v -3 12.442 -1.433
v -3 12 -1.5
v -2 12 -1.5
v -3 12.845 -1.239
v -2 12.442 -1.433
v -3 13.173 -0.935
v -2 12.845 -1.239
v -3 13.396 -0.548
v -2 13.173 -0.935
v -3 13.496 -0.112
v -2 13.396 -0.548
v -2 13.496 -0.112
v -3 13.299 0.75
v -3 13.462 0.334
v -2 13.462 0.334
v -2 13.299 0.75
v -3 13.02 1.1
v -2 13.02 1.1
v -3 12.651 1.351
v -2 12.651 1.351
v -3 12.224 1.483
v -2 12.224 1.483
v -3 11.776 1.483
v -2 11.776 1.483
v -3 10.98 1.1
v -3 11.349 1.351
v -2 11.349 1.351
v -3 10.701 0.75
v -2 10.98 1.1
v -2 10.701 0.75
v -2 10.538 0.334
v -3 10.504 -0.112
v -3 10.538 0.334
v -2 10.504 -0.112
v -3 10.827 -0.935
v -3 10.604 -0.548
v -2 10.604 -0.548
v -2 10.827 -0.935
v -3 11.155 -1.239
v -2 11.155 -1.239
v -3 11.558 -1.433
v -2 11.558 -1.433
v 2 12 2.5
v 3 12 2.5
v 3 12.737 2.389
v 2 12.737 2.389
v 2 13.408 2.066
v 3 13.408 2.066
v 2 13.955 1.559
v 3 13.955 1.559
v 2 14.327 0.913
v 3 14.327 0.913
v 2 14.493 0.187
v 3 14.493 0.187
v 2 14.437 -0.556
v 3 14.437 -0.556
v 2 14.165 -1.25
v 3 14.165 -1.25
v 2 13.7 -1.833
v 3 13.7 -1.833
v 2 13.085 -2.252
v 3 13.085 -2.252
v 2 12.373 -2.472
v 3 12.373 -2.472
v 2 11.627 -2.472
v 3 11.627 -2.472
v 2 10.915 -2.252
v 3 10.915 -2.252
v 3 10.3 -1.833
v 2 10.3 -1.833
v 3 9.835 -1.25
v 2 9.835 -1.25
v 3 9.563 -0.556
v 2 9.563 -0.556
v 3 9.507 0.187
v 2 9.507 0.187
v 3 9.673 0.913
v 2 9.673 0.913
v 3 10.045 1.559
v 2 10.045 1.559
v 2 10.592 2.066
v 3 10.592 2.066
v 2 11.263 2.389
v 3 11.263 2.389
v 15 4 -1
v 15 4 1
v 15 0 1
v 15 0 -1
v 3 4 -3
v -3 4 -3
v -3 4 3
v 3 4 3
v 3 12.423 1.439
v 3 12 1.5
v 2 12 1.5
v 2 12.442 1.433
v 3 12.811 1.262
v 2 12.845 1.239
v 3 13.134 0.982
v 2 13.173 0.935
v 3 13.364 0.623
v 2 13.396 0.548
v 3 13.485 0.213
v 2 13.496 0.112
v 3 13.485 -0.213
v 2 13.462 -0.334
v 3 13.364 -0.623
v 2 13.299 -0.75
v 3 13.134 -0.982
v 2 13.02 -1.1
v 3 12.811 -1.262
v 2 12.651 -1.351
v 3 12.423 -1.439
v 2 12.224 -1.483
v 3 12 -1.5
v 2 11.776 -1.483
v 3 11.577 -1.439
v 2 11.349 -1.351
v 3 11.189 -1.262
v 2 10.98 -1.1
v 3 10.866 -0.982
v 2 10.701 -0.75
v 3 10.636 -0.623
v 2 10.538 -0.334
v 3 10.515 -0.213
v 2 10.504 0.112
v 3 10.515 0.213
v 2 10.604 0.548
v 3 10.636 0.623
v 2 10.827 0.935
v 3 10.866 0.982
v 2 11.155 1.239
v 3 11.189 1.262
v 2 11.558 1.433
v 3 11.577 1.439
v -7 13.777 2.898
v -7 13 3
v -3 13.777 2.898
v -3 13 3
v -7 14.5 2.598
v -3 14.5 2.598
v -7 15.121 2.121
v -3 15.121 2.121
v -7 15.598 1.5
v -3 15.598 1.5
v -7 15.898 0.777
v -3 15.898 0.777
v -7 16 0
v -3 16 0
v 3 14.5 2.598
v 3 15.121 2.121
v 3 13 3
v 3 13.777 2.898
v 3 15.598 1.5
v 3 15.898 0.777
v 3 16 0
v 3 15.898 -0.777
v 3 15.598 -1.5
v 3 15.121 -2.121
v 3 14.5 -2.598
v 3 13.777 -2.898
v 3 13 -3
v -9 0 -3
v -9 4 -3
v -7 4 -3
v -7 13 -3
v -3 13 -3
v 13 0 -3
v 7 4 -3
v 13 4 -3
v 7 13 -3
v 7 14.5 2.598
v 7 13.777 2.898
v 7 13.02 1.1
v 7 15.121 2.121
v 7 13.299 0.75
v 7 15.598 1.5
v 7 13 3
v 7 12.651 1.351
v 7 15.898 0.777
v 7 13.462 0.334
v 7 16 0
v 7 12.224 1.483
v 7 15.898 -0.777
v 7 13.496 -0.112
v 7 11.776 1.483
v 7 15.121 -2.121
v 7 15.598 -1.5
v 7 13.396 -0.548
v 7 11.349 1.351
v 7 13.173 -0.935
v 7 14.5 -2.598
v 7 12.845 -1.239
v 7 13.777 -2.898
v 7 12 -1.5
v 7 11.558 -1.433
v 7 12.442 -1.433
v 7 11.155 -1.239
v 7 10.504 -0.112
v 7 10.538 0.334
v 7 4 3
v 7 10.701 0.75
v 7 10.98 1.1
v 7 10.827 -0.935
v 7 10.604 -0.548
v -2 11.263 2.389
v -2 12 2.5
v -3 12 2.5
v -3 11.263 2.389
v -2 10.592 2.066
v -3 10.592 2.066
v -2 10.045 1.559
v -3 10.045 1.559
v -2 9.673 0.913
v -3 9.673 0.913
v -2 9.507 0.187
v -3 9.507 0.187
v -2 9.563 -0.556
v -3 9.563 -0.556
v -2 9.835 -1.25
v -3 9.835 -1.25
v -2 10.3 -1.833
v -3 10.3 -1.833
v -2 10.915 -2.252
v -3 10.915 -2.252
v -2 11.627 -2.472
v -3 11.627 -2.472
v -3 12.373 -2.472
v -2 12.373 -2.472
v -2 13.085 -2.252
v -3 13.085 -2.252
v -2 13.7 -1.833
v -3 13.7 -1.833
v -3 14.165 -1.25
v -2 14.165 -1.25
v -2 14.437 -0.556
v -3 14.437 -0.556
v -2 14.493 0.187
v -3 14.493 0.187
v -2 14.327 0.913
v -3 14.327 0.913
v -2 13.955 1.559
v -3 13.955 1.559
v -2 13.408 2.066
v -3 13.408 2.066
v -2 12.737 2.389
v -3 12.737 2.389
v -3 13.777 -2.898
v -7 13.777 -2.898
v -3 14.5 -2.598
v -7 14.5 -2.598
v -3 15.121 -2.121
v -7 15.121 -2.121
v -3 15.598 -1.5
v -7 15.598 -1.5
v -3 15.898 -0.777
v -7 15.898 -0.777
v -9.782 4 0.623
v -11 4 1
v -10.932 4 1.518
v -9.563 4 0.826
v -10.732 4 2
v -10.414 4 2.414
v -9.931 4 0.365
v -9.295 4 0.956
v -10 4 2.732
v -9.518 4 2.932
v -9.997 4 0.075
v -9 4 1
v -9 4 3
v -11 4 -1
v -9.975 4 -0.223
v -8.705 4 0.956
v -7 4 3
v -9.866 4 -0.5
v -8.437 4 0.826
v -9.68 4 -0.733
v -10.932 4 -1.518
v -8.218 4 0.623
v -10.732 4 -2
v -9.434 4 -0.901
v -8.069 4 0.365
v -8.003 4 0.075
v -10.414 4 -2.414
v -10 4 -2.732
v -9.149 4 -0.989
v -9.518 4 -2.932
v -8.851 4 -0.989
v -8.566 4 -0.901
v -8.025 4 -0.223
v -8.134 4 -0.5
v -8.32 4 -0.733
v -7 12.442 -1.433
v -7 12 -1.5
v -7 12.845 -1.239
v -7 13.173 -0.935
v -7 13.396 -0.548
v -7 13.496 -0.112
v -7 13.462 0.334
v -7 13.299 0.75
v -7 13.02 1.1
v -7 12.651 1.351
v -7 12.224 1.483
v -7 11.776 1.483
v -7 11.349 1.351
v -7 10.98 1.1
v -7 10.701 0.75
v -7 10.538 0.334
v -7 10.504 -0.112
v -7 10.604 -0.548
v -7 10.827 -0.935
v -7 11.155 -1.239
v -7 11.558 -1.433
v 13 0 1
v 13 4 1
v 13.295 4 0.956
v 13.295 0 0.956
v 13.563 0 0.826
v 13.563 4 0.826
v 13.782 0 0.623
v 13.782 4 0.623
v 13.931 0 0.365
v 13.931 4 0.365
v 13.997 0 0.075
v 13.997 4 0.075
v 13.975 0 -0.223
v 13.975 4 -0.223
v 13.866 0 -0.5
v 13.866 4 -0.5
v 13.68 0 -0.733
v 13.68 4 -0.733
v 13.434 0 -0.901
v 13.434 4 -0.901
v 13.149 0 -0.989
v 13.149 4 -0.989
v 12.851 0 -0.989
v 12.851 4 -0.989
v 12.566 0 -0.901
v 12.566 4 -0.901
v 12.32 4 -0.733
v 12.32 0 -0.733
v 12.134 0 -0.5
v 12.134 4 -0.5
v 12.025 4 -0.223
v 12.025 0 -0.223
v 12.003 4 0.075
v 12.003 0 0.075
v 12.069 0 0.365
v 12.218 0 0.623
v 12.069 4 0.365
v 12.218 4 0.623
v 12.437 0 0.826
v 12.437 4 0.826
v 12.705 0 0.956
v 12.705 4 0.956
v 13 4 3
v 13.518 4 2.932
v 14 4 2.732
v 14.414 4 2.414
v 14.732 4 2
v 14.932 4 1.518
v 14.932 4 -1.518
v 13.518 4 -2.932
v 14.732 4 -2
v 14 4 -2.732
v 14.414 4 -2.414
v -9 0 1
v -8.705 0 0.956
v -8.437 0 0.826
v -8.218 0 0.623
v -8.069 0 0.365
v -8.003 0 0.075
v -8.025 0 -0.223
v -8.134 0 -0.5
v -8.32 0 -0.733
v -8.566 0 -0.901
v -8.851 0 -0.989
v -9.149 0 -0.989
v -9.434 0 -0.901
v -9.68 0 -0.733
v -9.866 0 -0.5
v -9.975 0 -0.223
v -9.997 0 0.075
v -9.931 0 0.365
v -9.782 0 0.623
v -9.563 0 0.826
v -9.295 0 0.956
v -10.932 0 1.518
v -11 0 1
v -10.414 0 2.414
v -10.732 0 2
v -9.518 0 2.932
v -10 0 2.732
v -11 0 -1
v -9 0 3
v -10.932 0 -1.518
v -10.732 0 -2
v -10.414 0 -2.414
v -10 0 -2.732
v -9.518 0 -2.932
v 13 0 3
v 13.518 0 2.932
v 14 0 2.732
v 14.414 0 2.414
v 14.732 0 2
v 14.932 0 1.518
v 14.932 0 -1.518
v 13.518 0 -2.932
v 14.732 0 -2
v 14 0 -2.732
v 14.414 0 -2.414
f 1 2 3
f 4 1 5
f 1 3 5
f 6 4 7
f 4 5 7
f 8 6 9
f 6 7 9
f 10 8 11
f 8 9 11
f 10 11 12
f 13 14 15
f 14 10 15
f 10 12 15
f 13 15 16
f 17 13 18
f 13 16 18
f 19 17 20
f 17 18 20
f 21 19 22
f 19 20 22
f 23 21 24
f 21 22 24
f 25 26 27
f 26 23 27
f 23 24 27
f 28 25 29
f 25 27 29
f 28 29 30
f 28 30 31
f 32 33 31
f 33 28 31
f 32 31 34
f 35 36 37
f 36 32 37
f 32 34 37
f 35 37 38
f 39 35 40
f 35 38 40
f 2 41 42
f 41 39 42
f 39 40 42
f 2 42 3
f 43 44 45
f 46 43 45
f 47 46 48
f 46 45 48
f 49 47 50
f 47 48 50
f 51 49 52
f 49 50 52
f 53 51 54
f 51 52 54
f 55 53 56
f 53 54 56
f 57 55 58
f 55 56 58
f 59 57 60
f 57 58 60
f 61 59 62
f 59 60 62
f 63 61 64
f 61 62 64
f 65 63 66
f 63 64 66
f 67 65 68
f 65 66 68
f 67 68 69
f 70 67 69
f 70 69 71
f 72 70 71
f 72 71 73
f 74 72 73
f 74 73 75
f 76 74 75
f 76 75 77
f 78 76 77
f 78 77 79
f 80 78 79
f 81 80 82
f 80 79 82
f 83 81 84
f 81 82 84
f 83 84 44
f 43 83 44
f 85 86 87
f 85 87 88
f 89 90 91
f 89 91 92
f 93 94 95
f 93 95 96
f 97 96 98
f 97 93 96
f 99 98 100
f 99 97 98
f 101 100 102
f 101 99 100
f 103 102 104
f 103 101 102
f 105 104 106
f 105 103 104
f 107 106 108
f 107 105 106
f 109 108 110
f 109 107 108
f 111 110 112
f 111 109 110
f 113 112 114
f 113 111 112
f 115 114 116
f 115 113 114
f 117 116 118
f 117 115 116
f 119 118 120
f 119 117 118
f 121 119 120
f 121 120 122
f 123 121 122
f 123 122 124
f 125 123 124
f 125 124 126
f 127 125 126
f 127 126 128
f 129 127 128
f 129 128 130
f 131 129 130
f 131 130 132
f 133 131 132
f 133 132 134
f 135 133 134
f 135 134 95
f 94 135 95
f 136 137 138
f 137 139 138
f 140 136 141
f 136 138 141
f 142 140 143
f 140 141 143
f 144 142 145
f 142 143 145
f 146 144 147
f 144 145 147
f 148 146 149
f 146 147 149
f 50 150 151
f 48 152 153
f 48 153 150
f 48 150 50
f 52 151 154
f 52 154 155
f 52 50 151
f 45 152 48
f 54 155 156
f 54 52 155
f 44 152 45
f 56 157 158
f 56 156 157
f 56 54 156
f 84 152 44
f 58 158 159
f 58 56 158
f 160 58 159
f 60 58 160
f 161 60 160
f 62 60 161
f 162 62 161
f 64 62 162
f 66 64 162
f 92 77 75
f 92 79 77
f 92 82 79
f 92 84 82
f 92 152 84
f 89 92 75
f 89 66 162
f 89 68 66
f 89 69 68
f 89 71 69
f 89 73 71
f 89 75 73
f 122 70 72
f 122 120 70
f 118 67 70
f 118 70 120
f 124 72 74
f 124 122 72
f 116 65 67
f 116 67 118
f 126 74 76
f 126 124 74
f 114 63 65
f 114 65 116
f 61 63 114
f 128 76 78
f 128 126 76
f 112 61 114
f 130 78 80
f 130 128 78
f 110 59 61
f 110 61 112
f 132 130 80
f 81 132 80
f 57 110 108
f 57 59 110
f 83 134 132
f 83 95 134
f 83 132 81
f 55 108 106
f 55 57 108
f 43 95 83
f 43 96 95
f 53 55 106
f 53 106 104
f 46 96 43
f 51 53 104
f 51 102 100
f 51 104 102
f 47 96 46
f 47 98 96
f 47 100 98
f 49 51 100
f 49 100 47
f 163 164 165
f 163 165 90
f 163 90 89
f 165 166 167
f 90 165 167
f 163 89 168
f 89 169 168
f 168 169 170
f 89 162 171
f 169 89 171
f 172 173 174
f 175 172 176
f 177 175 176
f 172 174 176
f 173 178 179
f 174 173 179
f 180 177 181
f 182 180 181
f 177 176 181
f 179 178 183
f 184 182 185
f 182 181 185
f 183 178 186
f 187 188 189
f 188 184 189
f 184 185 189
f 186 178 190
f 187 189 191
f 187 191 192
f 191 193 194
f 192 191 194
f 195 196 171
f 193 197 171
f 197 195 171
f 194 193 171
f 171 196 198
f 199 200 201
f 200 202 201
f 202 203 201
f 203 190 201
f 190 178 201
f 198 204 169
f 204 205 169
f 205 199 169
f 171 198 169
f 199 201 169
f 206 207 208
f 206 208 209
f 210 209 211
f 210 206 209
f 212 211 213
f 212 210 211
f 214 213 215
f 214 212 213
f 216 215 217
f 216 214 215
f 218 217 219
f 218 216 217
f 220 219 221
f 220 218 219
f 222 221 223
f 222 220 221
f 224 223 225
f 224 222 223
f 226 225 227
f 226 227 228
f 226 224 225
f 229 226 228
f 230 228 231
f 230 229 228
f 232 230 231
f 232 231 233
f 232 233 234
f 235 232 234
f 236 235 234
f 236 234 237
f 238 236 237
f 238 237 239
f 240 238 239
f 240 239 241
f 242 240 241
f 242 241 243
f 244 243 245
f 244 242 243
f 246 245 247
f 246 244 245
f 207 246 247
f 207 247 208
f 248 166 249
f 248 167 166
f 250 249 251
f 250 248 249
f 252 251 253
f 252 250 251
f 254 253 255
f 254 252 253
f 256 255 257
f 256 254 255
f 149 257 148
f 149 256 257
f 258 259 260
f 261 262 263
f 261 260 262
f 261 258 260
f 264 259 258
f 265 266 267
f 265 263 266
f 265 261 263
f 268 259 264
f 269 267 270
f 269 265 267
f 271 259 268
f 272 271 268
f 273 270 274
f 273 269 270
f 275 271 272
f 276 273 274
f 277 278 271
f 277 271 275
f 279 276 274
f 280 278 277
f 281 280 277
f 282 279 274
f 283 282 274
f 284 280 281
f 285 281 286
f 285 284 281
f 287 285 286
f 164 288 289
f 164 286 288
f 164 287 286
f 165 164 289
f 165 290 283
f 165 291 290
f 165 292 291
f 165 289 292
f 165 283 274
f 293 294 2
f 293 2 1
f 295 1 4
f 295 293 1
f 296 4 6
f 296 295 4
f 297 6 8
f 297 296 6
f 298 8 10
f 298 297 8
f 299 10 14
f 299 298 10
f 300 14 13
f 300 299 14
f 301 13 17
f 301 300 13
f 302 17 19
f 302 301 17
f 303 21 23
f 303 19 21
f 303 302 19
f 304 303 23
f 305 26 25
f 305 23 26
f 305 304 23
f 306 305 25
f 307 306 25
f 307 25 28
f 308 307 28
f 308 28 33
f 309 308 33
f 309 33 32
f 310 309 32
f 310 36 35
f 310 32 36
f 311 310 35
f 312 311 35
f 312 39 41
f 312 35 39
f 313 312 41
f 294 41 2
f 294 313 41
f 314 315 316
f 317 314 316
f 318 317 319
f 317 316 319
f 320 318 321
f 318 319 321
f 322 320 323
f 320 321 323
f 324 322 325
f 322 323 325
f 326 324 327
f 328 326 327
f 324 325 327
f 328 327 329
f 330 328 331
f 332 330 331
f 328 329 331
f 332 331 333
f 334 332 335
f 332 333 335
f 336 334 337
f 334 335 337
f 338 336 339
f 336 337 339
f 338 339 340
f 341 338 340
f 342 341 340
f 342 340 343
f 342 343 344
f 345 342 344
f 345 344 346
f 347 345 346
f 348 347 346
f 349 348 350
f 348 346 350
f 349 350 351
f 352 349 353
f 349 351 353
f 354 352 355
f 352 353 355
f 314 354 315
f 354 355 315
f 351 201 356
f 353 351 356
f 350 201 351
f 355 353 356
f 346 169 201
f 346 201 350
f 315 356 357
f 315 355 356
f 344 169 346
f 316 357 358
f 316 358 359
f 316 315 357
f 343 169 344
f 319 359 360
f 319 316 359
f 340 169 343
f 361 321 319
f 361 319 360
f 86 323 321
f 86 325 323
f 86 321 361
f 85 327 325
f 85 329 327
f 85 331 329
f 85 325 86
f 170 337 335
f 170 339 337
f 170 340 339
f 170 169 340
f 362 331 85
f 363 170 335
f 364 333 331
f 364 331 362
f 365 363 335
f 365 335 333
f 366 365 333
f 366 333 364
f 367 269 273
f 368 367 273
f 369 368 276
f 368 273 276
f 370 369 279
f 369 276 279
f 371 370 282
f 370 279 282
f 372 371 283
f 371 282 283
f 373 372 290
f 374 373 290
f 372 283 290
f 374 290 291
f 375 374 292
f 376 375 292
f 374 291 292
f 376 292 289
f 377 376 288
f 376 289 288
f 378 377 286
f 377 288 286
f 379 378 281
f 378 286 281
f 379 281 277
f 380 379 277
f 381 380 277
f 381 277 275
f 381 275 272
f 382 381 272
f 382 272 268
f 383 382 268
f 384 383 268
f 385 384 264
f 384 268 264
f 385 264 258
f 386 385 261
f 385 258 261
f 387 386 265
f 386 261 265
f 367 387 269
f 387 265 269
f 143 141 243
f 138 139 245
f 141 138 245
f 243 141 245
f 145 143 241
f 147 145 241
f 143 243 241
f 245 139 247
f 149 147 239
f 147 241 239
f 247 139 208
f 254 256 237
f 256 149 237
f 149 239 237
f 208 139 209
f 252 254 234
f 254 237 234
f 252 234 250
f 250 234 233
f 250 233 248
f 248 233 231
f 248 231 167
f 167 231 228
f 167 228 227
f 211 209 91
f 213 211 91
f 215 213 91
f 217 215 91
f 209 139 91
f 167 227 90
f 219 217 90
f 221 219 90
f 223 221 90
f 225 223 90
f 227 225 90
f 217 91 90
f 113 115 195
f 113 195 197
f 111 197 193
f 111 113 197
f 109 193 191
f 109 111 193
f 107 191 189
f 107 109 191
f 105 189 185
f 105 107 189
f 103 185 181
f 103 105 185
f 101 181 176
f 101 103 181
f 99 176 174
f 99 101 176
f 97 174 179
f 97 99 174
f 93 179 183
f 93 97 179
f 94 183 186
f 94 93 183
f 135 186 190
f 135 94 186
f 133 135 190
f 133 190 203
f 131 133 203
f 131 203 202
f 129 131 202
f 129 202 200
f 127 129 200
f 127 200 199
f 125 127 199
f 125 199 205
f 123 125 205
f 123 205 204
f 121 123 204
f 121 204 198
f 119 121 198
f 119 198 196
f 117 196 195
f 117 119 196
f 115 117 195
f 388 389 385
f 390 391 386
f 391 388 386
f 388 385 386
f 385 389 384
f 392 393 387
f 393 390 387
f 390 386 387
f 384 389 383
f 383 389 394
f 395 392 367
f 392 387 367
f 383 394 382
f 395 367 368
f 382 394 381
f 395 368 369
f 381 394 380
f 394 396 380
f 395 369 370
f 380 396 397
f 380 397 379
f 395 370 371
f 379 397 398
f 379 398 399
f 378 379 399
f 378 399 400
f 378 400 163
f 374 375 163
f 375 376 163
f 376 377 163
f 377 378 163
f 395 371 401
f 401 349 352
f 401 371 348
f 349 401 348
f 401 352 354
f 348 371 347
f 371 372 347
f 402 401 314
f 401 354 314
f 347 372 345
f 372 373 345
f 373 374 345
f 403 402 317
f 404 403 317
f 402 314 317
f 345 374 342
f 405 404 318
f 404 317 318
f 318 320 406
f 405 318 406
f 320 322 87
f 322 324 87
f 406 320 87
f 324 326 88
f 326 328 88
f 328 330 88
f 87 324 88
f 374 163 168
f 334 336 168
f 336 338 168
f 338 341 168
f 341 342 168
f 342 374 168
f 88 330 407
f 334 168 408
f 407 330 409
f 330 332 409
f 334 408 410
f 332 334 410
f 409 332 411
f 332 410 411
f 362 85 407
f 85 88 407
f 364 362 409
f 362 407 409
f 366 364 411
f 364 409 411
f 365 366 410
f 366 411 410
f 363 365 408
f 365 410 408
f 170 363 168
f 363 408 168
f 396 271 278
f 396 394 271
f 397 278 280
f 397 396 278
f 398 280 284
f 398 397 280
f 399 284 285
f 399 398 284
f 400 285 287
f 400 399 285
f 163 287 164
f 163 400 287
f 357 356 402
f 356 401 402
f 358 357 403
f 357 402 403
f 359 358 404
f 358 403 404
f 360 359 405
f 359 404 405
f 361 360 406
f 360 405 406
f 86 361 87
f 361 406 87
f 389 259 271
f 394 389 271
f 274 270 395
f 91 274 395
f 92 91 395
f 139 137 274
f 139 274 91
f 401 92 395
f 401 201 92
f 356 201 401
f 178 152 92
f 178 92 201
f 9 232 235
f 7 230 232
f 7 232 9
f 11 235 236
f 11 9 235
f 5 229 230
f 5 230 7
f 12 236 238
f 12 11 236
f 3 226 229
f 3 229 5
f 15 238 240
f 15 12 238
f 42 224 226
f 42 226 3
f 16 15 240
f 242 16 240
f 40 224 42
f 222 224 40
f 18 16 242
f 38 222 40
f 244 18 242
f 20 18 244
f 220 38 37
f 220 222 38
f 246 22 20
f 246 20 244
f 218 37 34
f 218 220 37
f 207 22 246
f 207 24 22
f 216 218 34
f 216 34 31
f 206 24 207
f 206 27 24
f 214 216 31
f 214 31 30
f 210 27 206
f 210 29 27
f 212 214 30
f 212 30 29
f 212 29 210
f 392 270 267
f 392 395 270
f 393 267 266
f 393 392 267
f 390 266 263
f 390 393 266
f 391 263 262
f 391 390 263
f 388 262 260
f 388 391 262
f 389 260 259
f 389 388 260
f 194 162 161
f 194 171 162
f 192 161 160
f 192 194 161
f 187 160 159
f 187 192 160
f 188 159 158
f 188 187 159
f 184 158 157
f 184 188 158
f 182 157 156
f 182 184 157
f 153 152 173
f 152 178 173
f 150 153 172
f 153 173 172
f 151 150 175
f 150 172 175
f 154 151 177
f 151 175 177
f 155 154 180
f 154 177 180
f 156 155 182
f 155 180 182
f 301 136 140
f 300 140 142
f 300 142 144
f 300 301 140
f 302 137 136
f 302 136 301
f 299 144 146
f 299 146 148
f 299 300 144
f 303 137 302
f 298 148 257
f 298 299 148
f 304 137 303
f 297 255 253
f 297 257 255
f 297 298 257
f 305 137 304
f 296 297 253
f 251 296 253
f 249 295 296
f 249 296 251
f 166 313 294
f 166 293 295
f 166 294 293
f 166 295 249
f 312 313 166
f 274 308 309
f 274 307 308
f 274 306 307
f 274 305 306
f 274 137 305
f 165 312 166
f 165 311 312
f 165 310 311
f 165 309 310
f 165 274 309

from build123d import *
from build123d.topology import SkipClean

# Parameters (mm, degrees)
SKETCH2_W               = 14
SKETCH2_H               = 6
BOSS_EXTRUDE1_DEPTH     = 4
SKETCH3_W               = 4
SKETCH3_H               = 6
BOSS_EXTRUDE2_DEPTH     = 12
CUT_EXTRUDE1_DEPTH      = 22.470910554
CUT_EXTRUDE1_DEPTH_BACK = 22.470910554
SKETCH4_R               = 1.5
BOSS_EXTRUDE3_START     = 1
SKETCH5_R               = 2.5
SKETCH5_R_2             = 1.5
BOSS_EXTRUDE3_DEPTH     = 1
SKETCH6_R               = 2.5
SKETCH6_R_2             = 1.5
BOSS_EXTRUDE4_DEPTH     = 1
SKETCH7_W               = 8
SKETCH7_H               = 6
SKETCH7_R               = 1
SKETCH7_W_2             = 4
BOSS_EXTRUDE5_DEPTH     = 4
FILLET1_R               = 2
FILLET2_R               = 3


with BuildPart() as part:
    # Sketch2 → Boss-Extrude1 (new body)
    with BuildSketch(Plane(origin=(0, 0, 0), x_dir=(1, 0, 0), z_dir=(0, 1, 0))):
        Rectangle(SKETCH2_W, SKETCH2_H)
    extrude(amount=BOSS_EXTRUDE1_DEPTH)

    # Sketch3 → Boss-Extrude2 (add)
    with BuildSketch(Plane(origin=(0, 4, 0), x_dir=(1, 0, 0), z_dir=(0, 1, 0))):
        with Locations((-5, 0)):
            Rectangle(SKETCH3_W, SKETCH3_H)
        with Locations((5, 0)):
            Rectangle(SKETCH3_W, SKETCH3_H)
    extrude(amount=BOSS_EXTRUDE2_DEPTH)

    # Sketch4 → Cut-Extrude1 (cut, two sides: drawn at the far end of the back side and taken through both)
    with BuildSketch(Plane(origin=(7, 0, 0), x_dir=(0, 0, -1), z_dir=(1, 0, 0)).offset(-CUT_EXTRUDE1_DEPTH_BACK)):
        with Locations((0, 12)):
            Circle(SKETCH4_R)
    extrude(amount=CUT_EXTRUDE1_DEPTH + CUT_EXTRUDE1_DEPTH_BACK, mode=Mode.SUBTRACT)

    # Sketch5 → Boss-Extrude3 (add)
    with BuildSketch(Plane(origin=(-3, 0, 0), x_dir=(0, 0, -1), z_dir=(1, 0, 0)).offset(BOSS_EXTRUDE3_START)):
        with Locations(Location((0, 12, 0), (0, 0, 180))):
            Circle(SKETCH5_R)
        with Locations((0, 12)):
            Circle(SKETCH5_R_2, mode=Mode.SUBTRACT)
    extrude(amount=-BOSS_EXTRUDE3_DEPTH)

    # Sketch6 → Boss-Extrude4 (add)
    with SkipClean():  # the faces are left unmerged after this step: merging them gives an invalid solid
        with BuildSketch(Plane.ZY.offset(-3)):
            with Locations((0, 12)):
                Circle(SKETCH6_R)
            with Locations((0, 12)):
                Circle(SKETCH6_R_2, mode=Mode.SUBTRACT)
        extrude(amount=BOSS_EXTRUDE4_DEPTH)

    # Sketch7 → Boss-Extrude5 (add)
    # profile 1 of 2: a face of its own
    with SkipClean():  # the faces are left unmerged after this step: merging them gives an invalid solid
        with BuildSketch(Plane(origin=(0, 4, 0), x_dir=(1, 0, 0), z_dir=(0, 1, 0))):
            with Locations((11, 0)):
                Rectangle(SKETCH7_W, SKETCH7_H)
            with Locations(Location((13, 0, 0), (0, 0, 270))):
                Circle(SKETCH7_R, mode=Mode.SUBTRACT)
        # profile 2 of 2: a face of its own
        with BuildSketch(Plane(origin=(0, 4, 0), x_dir=(1, 0, 0), z_dir=(0, 1, 0))):
            with Locations((-9, 0)):
                Rectangle(SKETCH7_W_2, SKETCH7_H)
            with Locations(Location((-9, 0, 0), (0, 0, 270))):
                Circle(SKETCH7_R, mode=Mode.SUBTRACT)
        extrude(amount=-BOSS_EXTRUDE5_DEPTH)

    # Fillet1
    fillet1_edges = [part.edges().sort_by_distance(p)[0] for p in [
        (15, 2, -3),
        (15, 2, 3),
        (-11, 2, 3),
        (-11, 2, -3),
    ]]
    fillet(fillet1_edges, radius=FILLET1_R)

    # Fillet2
    fillet2_edges = [part.edges().sort_by_distance(p)[0] for p in [
        (-5, 16, -3),
        (5, 16, -3),
        (5, 16, 3),
        (-5, 16, 3),
    ]]
    fillet(fillet2_edges, radius=FILLET2_R - 0.0001)  # a hair under: the kernel refuses the full size


solid = part.part
